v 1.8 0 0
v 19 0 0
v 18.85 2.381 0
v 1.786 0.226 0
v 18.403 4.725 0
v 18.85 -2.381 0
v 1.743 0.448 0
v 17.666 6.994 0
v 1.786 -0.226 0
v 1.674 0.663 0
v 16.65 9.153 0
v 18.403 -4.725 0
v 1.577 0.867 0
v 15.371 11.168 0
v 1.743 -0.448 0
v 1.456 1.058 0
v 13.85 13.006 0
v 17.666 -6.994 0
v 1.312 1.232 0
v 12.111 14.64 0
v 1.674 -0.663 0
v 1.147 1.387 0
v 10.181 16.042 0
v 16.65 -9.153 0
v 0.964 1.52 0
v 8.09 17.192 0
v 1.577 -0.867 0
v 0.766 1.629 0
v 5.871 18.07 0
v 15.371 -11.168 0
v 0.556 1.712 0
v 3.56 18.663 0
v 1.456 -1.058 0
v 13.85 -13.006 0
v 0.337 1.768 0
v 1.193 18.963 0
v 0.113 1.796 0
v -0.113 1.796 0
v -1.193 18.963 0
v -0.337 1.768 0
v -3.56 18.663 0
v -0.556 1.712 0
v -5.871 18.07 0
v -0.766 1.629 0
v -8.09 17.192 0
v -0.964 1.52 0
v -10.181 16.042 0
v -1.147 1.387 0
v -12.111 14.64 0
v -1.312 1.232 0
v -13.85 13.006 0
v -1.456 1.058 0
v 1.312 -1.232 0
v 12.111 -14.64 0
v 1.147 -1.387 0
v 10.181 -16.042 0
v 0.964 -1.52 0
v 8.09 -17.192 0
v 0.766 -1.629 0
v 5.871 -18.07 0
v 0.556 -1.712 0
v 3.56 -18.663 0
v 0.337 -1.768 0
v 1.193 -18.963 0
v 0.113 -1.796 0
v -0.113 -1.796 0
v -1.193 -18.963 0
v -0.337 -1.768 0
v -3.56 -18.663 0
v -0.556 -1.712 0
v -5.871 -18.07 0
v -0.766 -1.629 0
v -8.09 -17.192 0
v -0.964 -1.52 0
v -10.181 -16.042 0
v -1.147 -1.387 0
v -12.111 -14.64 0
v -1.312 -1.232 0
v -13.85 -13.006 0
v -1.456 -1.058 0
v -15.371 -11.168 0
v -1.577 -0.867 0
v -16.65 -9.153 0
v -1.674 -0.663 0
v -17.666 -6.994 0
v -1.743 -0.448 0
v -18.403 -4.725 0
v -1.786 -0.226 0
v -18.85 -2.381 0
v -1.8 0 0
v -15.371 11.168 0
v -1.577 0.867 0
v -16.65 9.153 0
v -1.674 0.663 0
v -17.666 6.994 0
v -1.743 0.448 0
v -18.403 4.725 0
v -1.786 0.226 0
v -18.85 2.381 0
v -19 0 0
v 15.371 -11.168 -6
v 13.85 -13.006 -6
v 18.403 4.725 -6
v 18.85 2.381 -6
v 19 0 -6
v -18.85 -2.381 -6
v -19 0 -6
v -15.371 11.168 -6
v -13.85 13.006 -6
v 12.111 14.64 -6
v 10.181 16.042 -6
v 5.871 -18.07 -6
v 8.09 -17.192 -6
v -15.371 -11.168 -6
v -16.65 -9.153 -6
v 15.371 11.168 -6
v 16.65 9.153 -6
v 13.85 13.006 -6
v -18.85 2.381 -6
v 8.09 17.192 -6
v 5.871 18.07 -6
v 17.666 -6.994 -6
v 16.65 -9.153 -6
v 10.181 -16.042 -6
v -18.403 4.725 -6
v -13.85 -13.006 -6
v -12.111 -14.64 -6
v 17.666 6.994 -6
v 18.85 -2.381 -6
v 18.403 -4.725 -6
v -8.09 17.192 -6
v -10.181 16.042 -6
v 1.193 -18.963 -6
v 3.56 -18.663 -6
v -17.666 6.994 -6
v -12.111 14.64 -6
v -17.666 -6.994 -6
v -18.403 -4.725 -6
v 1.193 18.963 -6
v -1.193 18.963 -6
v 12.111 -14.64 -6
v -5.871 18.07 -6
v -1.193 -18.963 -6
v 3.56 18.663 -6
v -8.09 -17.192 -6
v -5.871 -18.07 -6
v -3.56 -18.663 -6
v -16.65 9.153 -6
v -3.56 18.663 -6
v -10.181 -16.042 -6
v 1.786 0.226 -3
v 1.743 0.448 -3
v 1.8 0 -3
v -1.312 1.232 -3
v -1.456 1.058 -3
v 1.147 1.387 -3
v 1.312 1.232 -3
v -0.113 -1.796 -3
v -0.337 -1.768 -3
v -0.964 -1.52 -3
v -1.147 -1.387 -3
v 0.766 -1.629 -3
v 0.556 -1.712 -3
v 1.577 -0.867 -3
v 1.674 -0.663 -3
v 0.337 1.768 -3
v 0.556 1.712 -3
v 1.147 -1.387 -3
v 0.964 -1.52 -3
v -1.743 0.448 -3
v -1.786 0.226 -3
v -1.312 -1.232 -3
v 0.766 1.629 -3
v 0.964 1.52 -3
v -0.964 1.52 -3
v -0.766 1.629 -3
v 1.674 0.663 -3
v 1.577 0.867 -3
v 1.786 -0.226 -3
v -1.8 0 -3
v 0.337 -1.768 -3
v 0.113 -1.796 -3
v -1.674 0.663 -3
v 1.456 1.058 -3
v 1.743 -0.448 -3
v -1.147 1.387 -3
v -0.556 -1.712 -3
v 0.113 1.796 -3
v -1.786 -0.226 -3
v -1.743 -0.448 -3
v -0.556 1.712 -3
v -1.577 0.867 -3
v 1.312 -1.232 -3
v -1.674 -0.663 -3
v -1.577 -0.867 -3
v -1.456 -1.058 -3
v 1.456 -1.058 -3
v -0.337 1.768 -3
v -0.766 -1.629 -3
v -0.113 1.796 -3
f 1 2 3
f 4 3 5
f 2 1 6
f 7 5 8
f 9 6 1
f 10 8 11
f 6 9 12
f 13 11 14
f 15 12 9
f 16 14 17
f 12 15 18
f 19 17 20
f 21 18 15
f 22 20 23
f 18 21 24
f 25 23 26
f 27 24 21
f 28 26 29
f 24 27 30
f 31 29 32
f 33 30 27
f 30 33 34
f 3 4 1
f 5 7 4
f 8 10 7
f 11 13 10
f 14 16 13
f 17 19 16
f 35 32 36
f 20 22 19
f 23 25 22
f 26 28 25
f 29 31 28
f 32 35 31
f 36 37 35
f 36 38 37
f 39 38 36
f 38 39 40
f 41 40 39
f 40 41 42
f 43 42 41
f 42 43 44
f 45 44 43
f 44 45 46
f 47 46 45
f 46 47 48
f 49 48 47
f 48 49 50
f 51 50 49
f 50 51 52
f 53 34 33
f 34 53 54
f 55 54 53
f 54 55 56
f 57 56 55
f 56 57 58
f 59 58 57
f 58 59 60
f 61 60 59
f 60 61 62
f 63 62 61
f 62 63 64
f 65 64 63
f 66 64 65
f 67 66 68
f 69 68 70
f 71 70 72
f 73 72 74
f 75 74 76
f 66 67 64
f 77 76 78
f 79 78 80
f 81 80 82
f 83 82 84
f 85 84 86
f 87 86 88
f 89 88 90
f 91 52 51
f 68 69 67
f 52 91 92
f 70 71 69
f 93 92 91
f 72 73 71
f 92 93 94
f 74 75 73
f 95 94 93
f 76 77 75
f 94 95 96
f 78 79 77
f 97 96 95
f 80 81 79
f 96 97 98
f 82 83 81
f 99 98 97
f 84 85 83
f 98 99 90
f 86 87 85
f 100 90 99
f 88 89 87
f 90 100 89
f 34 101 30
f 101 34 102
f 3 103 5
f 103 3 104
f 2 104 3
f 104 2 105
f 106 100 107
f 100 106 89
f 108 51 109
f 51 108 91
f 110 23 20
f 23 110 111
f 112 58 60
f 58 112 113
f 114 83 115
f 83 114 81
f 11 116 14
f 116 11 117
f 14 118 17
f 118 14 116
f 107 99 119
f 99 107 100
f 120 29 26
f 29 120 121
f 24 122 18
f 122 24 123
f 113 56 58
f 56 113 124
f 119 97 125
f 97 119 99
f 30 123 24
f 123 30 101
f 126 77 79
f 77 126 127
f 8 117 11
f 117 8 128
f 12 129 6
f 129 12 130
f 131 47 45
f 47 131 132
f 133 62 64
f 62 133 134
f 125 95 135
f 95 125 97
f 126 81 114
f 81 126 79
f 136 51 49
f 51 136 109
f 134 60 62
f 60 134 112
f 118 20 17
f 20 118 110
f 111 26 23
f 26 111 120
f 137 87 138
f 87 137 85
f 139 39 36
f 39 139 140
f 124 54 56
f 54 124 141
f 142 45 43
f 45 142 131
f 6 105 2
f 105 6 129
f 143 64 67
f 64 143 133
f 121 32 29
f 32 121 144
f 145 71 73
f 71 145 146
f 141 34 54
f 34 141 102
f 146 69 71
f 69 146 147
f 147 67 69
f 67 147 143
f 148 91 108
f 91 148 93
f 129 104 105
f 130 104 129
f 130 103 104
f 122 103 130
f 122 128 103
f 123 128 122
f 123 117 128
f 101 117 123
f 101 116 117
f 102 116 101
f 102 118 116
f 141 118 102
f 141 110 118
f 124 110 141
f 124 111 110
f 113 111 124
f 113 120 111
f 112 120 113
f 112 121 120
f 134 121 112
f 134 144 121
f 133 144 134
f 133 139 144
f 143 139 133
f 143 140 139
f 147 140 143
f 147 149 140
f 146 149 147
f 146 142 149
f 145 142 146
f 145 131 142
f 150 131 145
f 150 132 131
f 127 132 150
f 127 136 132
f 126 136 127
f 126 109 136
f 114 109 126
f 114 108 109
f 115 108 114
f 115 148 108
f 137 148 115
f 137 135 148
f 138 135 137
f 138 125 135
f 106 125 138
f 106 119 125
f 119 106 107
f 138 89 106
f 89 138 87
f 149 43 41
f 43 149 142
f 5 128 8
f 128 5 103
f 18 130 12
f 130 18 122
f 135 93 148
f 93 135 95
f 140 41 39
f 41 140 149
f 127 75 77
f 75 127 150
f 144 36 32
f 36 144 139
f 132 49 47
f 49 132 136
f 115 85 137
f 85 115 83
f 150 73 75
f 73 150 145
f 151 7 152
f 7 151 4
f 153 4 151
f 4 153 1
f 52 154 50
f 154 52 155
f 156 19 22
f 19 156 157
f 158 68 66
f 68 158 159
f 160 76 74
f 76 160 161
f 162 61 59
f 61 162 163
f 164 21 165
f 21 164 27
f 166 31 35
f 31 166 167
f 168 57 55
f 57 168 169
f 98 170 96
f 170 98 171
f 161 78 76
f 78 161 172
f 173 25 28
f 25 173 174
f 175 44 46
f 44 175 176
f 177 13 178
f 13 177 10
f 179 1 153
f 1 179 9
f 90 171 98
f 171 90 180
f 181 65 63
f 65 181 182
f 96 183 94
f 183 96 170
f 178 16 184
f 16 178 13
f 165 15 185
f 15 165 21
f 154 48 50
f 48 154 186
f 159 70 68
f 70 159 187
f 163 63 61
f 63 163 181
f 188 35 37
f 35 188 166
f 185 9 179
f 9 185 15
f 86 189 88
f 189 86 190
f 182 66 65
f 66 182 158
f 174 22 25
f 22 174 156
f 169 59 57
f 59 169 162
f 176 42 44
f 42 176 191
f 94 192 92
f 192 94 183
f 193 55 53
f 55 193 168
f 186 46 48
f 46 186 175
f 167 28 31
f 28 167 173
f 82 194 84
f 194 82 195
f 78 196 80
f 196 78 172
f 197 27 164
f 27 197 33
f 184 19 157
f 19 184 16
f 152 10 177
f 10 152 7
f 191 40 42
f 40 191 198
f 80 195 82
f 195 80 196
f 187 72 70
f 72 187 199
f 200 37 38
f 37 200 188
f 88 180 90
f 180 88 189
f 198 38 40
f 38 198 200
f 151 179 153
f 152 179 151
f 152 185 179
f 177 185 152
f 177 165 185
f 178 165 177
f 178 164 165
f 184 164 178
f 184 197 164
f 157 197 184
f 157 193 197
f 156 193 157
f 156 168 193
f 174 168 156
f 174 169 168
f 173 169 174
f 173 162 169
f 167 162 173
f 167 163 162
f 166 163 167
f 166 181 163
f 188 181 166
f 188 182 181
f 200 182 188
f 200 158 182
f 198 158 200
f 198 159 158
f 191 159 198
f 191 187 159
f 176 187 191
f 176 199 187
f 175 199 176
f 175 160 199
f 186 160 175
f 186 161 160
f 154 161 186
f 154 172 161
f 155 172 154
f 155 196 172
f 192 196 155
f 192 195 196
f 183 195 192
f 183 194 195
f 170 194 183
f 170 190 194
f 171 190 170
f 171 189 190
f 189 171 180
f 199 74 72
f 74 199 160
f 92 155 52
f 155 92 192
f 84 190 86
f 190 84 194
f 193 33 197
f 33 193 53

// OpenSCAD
$fn = 50;


difference() {
	union() {
		translate(v = [0, 0, -3.0000000000]) {
			cylinder(h = 3, r = 10.0000000000);
		}
		translate(v = [0, 0, -6.0000000000]) {
			cylinder(h = 6, r = 19.0000000000);
		}
	}
	union() {
		#translate(v = [0, 0, -3]) {
			cylinder(h = 3, r = 1.8000000000);
		}
	}
}
